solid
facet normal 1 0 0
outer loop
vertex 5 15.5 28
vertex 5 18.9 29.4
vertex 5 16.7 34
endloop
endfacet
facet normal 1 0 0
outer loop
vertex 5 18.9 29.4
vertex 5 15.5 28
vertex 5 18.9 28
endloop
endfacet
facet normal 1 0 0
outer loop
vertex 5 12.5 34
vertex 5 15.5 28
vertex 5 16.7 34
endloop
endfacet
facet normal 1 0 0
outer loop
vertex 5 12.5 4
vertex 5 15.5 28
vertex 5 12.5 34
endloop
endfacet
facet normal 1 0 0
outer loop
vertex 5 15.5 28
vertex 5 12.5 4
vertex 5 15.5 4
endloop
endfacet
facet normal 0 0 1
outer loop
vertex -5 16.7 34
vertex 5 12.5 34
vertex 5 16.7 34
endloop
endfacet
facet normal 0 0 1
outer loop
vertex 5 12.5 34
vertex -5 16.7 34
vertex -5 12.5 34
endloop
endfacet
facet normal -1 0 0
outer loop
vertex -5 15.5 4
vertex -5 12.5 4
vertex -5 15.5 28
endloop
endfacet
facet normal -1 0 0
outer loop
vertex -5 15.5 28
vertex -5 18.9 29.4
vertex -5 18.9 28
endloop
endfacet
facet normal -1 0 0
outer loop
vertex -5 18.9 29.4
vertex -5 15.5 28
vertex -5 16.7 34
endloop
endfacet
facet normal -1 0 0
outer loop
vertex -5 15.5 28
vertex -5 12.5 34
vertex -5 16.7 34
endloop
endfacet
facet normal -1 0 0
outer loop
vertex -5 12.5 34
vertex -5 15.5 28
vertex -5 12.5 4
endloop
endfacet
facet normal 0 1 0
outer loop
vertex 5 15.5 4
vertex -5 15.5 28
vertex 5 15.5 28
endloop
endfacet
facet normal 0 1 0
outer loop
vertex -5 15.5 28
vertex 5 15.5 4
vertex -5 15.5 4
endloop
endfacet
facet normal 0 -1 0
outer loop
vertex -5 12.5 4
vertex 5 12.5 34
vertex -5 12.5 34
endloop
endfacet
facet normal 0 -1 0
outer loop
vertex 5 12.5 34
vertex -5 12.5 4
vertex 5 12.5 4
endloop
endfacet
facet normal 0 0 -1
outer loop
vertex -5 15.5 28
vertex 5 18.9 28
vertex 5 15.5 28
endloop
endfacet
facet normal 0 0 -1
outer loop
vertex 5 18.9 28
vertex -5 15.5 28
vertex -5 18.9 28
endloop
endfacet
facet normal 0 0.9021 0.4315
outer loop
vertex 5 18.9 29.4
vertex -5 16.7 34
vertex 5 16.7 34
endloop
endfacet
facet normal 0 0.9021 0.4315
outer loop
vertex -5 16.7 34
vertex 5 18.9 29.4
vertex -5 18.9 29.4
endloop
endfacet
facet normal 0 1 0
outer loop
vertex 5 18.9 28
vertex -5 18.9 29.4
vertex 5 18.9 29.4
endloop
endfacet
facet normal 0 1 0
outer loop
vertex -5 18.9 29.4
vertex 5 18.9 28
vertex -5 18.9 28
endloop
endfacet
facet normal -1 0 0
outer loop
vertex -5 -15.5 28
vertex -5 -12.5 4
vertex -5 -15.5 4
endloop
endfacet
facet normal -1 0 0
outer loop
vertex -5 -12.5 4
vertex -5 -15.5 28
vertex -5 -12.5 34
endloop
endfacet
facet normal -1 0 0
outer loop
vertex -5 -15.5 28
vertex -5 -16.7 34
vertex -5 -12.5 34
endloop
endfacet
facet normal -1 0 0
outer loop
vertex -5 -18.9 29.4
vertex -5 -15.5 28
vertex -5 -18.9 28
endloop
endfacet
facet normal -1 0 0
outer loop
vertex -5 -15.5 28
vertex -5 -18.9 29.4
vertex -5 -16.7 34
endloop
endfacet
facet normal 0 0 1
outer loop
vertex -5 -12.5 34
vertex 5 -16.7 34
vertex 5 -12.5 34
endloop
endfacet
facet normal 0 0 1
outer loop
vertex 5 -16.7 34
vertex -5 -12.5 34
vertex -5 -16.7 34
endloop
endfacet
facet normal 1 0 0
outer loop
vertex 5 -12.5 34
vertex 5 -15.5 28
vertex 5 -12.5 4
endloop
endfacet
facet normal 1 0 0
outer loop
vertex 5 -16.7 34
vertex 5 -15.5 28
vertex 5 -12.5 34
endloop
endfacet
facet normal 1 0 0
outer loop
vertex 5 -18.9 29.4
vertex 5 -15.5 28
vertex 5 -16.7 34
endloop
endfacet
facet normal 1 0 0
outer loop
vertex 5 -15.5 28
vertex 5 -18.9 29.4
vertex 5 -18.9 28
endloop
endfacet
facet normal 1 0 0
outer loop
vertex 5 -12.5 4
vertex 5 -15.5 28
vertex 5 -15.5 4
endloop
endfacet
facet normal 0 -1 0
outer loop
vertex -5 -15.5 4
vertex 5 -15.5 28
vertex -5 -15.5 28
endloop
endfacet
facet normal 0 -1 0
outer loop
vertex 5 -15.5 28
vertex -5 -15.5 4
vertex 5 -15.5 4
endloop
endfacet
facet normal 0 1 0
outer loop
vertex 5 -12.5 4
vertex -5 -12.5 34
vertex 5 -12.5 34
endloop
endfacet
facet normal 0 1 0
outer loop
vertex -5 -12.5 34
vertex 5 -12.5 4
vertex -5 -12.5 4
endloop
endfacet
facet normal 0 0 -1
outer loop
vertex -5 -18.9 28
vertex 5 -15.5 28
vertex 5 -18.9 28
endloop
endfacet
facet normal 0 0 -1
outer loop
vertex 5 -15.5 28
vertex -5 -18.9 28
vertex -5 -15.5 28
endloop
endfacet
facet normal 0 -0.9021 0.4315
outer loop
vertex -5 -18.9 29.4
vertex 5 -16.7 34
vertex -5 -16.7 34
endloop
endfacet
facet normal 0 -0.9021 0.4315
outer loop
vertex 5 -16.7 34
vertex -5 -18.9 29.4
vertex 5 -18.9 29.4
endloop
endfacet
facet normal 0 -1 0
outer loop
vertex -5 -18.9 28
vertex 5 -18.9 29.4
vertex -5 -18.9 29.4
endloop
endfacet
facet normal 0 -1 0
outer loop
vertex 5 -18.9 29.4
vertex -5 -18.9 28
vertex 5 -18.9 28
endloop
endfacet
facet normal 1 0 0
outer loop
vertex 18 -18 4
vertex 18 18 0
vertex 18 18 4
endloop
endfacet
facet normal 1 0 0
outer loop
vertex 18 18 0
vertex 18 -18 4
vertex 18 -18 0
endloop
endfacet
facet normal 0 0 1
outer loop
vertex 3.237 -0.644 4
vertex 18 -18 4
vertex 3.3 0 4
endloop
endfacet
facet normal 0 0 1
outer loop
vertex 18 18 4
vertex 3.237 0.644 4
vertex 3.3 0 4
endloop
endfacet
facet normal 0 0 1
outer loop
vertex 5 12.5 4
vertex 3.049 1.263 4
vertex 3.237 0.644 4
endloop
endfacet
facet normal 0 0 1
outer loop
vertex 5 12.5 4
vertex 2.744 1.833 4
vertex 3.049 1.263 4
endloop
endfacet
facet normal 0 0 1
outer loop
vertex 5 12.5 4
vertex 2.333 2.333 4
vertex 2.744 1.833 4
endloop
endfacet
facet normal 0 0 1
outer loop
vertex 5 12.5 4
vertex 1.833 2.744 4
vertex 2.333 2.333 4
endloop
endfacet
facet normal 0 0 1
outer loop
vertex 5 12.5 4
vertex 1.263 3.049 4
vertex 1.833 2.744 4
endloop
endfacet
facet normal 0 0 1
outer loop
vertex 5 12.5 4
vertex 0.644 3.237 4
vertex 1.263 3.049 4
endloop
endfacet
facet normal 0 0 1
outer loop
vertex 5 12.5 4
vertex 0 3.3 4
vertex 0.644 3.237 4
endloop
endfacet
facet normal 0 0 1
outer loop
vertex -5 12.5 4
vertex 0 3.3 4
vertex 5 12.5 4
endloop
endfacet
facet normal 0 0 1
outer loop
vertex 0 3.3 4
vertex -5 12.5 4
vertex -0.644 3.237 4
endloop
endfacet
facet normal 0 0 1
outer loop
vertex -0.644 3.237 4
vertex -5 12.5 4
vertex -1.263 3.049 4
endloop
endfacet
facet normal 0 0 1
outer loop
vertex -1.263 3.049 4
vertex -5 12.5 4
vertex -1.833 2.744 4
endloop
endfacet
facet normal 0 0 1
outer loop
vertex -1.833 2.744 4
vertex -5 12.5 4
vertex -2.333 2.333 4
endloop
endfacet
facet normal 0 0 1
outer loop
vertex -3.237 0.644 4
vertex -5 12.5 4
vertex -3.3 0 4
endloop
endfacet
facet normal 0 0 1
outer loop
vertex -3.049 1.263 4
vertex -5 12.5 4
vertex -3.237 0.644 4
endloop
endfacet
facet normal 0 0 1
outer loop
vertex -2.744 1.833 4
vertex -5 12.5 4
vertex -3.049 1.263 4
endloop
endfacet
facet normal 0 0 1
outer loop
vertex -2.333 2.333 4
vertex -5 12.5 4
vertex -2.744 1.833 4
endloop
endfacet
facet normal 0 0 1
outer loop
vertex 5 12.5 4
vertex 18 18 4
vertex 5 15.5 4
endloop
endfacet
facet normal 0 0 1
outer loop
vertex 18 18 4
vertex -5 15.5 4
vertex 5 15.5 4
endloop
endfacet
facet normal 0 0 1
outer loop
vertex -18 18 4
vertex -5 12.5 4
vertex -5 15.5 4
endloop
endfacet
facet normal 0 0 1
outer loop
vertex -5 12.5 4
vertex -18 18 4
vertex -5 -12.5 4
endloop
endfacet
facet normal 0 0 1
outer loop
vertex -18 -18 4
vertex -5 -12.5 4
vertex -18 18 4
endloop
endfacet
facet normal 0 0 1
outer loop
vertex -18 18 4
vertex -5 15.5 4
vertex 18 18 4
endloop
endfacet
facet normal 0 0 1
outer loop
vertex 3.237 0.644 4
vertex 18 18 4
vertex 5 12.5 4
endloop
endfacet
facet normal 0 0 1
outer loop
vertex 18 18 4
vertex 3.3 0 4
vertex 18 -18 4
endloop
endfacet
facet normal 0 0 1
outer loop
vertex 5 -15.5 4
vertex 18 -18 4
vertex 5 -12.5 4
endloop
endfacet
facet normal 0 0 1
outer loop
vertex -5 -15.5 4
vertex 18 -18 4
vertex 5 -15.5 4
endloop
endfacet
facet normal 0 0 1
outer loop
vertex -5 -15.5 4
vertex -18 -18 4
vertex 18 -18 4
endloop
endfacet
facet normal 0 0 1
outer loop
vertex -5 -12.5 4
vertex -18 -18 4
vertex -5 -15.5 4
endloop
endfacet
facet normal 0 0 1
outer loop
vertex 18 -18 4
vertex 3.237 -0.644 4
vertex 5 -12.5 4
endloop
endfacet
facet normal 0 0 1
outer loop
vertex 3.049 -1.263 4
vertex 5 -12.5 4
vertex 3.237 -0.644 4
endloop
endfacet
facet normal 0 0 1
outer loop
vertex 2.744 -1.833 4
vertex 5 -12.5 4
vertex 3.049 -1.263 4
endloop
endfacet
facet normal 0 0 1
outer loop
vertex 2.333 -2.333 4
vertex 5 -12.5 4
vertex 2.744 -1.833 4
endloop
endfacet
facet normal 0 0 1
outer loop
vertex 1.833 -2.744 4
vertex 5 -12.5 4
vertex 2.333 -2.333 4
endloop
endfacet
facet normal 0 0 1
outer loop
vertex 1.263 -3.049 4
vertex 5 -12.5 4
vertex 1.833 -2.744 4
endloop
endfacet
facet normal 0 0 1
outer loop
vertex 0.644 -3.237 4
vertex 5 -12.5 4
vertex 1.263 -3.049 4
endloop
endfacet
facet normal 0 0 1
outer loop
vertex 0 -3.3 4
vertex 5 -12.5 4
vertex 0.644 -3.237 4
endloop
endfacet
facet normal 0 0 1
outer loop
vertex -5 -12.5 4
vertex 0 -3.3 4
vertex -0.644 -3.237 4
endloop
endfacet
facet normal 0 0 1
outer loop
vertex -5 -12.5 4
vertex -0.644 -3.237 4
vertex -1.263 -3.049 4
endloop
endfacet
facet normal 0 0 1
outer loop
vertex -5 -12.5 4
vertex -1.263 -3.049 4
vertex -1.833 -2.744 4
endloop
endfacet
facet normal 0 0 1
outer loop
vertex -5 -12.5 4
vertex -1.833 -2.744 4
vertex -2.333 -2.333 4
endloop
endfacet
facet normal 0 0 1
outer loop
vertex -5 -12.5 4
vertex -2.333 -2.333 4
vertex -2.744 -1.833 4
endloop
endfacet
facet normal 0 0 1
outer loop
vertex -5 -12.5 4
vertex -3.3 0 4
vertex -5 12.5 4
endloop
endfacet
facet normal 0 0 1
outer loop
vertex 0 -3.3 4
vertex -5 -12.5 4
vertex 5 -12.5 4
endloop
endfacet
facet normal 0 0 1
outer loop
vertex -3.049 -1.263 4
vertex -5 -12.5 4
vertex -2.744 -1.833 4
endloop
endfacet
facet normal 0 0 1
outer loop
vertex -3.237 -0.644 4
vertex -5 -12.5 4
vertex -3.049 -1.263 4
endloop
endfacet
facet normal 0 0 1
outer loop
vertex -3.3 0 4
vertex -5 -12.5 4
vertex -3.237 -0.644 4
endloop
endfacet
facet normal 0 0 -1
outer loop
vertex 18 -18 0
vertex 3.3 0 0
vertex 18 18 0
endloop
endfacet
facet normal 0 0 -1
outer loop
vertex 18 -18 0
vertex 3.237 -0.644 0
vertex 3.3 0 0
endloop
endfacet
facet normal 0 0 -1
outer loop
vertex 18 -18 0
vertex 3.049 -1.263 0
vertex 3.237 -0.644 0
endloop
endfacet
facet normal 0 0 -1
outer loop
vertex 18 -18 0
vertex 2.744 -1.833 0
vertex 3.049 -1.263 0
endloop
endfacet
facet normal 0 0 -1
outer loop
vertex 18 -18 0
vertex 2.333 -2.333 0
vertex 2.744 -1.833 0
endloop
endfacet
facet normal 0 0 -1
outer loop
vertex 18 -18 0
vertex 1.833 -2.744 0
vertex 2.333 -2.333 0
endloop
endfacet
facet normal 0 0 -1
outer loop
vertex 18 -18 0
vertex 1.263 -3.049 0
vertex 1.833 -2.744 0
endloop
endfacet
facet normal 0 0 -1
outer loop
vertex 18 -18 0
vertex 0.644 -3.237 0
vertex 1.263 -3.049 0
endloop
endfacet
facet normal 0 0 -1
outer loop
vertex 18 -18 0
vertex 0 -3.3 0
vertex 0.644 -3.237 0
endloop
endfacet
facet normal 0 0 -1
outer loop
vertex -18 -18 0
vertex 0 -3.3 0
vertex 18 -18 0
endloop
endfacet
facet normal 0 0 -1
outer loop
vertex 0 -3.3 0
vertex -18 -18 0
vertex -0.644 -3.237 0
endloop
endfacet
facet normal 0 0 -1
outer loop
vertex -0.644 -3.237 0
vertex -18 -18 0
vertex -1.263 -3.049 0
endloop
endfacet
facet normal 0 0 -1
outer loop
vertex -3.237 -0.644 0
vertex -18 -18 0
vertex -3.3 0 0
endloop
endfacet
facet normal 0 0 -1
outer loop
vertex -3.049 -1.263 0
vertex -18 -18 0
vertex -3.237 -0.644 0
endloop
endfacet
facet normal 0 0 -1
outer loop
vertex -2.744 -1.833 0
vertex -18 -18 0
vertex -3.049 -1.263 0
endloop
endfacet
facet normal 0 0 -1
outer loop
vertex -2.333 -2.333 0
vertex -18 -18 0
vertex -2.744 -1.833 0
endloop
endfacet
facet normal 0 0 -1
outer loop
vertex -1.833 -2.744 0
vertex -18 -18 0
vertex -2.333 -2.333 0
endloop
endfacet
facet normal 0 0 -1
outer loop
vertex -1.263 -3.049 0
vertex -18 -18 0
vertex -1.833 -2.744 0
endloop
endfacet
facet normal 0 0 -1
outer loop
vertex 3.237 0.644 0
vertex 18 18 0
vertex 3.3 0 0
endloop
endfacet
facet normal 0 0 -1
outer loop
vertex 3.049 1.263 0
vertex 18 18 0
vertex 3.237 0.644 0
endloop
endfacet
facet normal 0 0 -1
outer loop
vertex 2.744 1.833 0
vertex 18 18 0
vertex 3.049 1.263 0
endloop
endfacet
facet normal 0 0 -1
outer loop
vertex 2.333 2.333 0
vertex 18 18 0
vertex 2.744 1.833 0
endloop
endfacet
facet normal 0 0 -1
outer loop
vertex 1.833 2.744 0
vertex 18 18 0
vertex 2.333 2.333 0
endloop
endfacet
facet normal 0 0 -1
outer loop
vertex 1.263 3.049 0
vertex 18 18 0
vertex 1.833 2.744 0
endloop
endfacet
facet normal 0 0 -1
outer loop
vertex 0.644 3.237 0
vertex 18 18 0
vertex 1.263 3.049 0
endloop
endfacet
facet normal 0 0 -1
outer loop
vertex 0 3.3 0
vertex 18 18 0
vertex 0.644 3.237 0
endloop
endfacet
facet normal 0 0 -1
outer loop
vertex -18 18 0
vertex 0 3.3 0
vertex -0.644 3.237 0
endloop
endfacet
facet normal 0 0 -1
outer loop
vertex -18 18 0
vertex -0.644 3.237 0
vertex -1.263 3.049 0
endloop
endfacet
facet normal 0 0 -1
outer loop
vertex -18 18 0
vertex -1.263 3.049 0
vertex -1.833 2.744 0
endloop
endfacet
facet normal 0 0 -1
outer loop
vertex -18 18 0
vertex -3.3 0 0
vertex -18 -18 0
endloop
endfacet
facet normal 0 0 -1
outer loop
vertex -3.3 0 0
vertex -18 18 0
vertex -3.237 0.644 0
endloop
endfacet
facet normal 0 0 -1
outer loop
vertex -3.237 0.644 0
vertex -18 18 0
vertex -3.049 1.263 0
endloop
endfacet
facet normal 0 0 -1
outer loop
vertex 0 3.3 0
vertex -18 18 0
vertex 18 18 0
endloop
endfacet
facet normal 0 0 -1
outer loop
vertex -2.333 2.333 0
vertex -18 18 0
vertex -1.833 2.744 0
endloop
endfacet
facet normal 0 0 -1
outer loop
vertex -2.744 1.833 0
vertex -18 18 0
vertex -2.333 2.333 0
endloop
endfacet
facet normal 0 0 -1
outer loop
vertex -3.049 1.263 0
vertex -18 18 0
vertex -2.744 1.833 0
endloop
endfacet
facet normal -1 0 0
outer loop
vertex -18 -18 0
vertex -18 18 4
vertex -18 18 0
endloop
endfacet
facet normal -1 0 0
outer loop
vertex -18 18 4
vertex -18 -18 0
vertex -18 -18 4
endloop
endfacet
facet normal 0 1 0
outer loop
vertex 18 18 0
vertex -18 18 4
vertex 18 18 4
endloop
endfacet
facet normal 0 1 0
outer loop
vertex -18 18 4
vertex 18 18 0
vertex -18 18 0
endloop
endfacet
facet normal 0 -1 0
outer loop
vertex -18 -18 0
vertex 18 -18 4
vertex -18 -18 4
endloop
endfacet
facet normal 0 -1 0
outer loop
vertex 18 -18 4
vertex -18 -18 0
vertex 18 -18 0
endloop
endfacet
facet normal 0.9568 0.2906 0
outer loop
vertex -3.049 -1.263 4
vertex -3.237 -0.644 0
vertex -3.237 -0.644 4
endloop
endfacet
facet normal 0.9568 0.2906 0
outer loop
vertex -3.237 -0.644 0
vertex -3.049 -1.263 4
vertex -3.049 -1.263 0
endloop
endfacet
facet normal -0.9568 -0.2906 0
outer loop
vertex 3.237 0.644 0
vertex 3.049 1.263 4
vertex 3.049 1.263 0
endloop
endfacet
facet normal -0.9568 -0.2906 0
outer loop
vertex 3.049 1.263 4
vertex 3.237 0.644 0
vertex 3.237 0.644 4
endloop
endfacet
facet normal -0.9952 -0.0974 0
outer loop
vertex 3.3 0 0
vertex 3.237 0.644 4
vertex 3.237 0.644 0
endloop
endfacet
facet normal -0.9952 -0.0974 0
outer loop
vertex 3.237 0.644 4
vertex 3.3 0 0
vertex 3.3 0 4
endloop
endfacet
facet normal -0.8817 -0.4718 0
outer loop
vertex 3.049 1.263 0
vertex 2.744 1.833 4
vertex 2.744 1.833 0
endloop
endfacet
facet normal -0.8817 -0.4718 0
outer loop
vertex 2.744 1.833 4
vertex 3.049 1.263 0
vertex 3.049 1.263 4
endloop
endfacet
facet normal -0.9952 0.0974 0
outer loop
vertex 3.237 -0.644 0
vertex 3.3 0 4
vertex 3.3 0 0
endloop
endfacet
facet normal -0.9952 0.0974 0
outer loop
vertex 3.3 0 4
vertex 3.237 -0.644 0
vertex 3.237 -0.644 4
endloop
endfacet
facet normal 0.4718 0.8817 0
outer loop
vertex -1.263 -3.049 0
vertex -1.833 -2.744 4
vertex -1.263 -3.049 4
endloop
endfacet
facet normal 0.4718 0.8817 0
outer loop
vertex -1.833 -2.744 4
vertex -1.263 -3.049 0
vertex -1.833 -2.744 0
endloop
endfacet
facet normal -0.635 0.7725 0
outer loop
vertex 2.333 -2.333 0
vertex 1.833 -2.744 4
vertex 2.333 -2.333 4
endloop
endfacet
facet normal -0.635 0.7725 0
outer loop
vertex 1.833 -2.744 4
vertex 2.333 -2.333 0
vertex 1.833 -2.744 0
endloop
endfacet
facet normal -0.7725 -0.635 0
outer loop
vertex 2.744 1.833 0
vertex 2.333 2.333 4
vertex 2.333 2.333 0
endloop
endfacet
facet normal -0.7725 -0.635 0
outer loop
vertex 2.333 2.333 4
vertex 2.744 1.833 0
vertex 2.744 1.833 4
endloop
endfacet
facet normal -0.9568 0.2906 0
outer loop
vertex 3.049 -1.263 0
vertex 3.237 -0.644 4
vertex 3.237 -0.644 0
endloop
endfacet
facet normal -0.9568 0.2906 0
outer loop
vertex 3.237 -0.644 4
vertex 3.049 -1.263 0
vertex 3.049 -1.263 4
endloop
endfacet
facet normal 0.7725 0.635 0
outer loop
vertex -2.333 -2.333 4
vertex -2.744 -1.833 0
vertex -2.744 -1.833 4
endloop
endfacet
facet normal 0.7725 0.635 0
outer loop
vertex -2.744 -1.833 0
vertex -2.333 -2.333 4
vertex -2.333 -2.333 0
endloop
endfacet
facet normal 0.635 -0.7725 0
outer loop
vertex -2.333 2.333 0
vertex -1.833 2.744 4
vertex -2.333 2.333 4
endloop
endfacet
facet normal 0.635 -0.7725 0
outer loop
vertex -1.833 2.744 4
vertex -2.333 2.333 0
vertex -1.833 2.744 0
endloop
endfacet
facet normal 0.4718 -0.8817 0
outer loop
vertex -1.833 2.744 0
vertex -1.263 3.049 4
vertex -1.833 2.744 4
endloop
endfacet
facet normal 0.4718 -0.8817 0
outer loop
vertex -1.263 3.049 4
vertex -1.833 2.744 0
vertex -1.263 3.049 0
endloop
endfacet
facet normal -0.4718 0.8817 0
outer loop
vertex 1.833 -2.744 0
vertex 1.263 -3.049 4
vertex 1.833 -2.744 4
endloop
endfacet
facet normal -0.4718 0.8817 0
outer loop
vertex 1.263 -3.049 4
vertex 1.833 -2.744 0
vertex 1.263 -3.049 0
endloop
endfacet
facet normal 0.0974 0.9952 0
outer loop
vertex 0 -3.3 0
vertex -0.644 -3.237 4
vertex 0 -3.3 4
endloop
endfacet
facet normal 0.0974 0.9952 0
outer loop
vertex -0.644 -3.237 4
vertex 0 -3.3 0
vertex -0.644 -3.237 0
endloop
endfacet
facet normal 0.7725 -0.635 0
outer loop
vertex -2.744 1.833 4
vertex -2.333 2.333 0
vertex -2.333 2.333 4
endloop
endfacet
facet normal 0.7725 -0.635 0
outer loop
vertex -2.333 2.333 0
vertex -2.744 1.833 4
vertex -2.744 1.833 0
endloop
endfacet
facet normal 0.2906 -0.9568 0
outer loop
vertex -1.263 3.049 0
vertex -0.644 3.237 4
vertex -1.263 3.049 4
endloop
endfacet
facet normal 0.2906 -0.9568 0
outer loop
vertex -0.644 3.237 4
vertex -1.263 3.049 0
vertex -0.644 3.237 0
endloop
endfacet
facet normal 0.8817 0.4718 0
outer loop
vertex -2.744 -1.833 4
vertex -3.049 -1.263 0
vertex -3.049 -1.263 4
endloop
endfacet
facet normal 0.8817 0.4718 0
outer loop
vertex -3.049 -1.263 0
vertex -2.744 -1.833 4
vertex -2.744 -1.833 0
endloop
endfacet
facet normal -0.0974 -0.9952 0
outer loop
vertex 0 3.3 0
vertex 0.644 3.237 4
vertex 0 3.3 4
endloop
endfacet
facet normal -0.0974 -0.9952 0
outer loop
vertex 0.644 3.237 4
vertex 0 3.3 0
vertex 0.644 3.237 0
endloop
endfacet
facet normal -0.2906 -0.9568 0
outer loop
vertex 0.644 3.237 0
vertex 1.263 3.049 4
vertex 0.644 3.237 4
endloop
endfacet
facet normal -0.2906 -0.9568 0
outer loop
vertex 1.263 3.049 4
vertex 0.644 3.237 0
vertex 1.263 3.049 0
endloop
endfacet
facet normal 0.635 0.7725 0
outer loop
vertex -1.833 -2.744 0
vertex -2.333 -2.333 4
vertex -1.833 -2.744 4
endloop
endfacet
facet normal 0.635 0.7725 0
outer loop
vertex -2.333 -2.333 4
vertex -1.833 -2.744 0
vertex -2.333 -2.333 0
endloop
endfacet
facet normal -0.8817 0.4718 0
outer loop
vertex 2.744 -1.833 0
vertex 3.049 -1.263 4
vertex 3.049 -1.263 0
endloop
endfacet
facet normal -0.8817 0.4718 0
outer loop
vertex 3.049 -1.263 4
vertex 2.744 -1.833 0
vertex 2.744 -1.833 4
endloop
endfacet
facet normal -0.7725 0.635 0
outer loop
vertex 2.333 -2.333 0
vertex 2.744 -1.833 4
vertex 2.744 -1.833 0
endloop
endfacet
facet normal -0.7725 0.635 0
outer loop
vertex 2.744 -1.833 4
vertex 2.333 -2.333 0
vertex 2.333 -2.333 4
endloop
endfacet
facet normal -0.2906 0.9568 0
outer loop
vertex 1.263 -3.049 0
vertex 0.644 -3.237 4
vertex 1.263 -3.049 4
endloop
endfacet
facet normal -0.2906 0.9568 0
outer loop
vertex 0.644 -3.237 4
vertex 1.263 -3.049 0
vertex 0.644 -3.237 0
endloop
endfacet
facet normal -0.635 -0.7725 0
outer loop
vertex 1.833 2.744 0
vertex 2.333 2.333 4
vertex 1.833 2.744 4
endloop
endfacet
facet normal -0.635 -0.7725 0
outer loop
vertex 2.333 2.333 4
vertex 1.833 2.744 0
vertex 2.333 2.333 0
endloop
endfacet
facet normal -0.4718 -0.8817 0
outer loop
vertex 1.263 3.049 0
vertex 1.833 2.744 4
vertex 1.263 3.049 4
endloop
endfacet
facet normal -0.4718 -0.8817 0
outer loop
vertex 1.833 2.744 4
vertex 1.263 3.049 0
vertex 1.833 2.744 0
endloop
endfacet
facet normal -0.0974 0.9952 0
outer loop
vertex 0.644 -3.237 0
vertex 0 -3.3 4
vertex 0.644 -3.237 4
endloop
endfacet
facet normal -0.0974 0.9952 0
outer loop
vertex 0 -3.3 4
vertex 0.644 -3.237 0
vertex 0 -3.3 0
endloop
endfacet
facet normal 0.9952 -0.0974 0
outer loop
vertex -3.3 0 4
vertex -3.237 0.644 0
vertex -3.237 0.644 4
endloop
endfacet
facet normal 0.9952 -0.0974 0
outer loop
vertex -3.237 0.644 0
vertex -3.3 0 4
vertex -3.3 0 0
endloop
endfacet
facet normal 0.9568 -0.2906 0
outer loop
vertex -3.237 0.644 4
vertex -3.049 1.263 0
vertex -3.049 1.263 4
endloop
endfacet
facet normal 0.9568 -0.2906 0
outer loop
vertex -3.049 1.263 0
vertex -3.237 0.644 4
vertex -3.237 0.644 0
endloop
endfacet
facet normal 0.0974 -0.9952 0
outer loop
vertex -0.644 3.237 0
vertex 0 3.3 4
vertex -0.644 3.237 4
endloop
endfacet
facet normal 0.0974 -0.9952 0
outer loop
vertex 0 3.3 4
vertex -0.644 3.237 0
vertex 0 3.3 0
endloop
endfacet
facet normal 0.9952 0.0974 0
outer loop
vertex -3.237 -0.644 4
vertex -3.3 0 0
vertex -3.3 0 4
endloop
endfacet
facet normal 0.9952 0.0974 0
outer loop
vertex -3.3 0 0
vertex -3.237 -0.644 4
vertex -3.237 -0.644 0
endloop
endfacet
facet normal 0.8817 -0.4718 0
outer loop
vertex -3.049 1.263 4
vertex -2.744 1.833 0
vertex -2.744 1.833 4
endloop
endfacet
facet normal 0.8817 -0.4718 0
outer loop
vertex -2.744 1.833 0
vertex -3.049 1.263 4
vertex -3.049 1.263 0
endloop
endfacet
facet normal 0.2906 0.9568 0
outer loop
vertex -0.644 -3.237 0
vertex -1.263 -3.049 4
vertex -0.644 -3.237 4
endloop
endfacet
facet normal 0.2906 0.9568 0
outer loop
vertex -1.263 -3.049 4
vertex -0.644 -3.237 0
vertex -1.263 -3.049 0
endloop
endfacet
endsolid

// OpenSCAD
$fn = 32;

// ----------------------------------------------------------------------
// Snap-fit latch: 2 arms, 30 mm tall, 3.6 mm undercut hooks
// ----------------------------------------------------------------------

// --- parameters (mm) ---
base_d = 36;              // base plate depth
base_h = 4;               // base plate thickness
span = 28;                // distance between opposite arms
arm_t = 3;                // arm thickness
arm_d = 10;               // arm width
height = 30;              // free arm length
head_len = 3.6;           // hook reach
head_h = 6;               // hook height
lead = 1.4;               // lead-in ramp thickness
bore_d = 6.6;             // base fixing bore
top_z = 34;               // height of the arm tips above the base

arms = 2;

difference() {
  union() {
    /* base plate, centred on the arm ring */
    translate([-18, -18, 0]) cube([base_d, base_d, base_h]);
    for (a = [0 : 360 / arms : 359]) rotate([0, 0, a]) {
    /* arm, sunk 0.5 mm into the base */
    translate([-arm_d / 2, span / 2 - arm_t / 2, base_h - 0.5]) cube([arm_d, arm_t, height + 0.5]);
    /* hook: a convex hull of a tall inner block and a thin outer lip
       gives a flat undercut below and a lead-in ramp on top */
    hull() {
      translate([-arm_d / 2, span / 2 + arm_t / 2 - 0.6, top_z - head_h]) cube([arm_d, lead + 0.4, head_h]);
      translate([-arm_d / 2, span / 2 + arm_t / 2 - 0.2, top_z - head_h]) cube([arm_d, head_len, lead]);
    }
    }
  }
  translate([0, 0, -2.5]) cylinder(h = base_h + 5, d = bore_d);
}
